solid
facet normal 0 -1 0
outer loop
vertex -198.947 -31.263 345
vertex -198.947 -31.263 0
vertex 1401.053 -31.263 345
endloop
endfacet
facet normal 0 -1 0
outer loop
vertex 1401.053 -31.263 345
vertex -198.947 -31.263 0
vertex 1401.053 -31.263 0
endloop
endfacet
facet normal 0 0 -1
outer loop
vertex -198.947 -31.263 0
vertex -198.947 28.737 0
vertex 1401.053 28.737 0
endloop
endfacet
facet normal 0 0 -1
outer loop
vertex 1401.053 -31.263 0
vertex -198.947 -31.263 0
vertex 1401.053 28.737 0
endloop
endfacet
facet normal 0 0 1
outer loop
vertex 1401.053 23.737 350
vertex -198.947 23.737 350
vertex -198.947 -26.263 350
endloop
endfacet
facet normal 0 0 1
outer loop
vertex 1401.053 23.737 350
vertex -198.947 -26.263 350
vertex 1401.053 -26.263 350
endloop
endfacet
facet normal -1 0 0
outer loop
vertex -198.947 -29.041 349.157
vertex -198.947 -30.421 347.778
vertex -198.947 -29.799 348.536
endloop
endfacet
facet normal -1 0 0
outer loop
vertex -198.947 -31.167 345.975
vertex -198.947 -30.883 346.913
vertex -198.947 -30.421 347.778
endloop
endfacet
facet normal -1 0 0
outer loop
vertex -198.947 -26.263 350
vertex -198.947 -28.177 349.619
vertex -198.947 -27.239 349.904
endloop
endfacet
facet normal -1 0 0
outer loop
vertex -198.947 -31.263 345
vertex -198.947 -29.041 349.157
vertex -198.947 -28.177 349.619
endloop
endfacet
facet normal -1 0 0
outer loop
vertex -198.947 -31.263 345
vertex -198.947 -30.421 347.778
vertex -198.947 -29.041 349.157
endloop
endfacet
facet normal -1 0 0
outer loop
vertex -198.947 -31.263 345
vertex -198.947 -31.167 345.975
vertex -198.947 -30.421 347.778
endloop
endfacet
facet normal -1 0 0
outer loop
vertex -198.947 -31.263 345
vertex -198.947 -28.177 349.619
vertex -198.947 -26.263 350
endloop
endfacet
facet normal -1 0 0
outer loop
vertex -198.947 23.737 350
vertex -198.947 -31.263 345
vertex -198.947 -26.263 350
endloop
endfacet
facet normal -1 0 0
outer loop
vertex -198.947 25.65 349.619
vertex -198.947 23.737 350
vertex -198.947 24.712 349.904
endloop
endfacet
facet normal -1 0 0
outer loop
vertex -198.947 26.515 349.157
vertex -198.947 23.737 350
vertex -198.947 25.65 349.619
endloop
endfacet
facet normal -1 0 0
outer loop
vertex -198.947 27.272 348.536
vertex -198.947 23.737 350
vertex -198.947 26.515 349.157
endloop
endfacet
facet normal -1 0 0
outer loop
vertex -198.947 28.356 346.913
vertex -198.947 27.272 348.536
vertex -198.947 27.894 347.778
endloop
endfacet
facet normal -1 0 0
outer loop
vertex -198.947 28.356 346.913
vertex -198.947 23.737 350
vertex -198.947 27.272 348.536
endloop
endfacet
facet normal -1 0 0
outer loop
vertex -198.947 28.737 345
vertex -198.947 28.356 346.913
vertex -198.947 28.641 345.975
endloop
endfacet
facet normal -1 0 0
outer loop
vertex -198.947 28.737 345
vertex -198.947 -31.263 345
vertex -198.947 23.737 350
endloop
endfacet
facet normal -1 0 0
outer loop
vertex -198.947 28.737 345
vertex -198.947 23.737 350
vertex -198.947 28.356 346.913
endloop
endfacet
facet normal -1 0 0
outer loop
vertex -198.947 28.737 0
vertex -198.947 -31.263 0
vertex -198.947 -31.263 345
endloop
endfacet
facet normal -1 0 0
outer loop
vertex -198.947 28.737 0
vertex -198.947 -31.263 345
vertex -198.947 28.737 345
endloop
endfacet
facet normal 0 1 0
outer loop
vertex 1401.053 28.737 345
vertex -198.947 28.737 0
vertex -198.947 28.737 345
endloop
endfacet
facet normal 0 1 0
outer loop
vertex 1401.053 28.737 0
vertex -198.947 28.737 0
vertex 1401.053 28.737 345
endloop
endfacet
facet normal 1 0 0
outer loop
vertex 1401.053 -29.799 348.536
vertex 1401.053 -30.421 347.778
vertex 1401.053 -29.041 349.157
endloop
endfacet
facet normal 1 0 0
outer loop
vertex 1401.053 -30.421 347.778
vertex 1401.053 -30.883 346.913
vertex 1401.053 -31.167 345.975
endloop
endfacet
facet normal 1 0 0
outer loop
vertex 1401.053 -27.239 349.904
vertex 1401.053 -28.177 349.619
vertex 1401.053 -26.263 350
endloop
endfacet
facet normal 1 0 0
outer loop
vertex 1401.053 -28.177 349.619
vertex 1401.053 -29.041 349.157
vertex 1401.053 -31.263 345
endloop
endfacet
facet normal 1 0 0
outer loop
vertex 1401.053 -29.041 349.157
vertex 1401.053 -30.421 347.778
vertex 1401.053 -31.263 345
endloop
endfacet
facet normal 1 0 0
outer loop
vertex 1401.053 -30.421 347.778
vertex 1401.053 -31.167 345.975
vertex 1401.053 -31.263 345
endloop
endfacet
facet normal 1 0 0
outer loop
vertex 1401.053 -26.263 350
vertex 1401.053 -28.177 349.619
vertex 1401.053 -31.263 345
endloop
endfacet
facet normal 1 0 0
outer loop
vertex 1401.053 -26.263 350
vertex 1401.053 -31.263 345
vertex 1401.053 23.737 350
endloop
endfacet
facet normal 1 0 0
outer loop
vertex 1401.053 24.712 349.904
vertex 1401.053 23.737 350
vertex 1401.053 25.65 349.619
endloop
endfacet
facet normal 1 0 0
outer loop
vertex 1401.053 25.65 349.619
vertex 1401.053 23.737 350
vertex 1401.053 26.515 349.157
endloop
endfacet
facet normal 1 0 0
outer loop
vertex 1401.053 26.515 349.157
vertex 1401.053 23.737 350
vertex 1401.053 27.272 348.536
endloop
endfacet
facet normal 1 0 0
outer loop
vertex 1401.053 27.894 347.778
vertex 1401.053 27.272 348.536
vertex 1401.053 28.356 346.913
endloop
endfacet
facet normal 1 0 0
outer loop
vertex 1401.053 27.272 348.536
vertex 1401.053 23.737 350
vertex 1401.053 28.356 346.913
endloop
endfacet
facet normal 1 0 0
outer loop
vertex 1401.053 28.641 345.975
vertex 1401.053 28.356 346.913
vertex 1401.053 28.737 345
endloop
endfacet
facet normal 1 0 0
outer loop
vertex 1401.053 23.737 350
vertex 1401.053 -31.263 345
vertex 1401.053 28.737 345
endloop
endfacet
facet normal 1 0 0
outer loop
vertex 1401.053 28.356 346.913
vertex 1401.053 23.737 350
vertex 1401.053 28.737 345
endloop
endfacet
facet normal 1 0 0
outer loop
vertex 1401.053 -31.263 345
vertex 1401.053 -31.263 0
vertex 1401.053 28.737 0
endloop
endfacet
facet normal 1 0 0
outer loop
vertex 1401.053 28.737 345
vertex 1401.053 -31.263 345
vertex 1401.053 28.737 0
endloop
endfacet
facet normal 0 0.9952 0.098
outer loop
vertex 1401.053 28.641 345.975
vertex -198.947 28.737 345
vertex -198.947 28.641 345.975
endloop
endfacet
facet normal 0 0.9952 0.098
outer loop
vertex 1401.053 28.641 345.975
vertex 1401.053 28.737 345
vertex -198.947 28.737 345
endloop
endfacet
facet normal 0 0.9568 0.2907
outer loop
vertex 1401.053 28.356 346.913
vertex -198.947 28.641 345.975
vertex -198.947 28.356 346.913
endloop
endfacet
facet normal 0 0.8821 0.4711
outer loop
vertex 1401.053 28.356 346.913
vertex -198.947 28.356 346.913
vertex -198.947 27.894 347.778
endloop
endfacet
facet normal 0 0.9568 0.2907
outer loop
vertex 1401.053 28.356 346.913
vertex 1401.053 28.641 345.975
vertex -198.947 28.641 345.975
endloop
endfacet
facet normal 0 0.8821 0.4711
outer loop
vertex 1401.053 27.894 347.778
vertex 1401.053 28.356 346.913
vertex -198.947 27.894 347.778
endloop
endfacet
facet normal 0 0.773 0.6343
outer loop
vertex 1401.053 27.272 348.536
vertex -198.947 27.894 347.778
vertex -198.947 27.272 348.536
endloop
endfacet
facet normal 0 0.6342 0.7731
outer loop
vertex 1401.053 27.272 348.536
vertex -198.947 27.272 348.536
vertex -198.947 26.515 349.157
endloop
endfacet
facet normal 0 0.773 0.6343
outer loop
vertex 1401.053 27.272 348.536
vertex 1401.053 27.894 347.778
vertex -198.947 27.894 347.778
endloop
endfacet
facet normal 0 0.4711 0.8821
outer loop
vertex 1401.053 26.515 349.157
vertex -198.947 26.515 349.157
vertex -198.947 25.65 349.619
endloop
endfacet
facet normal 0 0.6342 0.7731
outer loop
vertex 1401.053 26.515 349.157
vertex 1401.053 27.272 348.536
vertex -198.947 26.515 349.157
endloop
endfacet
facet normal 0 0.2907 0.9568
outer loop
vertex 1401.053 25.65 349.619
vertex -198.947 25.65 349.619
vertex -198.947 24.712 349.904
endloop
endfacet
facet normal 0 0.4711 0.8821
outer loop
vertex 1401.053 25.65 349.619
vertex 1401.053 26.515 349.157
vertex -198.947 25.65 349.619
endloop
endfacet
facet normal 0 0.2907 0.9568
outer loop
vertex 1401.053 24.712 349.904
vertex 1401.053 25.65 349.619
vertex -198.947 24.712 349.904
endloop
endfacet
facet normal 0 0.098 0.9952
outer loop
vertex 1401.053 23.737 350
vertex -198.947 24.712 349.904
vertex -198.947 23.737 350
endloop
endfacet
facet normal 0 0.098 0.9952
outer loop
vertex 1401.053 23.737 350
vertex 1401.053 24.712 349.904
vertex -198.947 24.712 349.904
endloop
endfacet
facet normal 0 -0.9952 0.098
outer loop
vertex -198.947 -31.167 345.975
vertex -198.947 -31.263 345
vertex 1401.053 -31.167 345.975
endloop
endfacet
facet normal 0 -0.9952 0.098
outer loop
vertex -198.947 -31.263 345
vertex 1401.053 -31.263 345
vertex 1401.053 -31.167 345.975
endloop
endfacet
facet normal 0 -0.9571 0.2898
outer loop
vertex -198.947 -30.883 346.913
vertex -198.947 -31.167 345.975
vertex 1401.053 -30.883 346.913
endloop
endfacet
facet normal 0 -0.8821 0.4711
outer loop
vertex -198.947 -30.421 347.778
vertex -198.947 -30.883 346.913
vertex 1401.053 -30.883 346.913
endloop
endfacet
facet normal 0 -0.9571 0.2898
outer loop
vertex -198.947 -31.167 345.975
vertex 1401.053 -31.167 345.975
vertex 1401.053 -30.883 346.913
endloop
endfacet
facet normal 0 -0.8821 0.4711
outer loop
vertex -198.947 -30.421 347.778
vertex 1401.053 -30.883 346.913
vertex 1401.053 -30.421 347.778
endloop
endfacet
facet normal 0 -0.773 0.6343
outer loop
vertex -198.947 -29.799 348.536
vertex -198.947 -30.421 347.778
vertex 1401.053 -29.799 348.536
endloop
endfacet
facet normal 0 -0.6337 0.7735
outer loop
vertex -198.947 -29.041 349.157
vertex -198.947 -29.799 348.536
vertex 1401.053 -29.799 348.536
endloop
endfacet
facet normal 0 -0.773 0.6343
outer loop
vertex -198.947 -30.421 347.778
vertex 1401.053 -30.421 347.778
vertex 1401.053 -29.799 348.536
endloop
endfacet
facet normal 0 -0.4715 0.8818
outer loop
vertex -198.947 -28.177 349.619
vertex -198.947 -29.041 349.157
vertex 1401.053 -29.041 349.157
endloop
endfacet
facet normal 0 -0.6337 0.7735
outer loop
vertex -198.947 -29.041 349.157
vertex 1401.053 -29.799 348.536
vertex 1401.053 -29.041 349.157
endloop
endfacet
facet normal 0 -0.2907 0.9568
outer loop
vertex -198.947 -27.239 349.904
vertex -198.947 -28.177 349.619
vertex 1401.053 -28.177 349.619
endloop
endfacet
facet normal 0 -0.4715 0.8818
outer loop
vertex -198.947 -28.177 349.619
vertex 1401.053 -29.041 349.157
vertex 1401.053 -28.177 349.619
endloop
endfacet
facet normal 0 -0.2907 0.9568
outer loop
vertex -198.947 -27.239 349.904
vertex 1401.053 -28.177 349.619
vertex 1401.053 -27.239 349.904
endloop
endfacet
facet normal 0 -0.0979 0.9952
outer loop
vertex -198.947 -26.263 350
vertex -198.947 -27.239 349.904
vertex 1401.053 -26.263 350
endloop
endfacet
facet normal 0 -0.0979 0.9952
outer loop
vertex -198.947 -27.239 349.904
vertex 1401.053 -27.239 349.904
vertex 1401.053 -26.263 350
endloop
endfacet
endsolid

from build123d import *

# Parameters (mm, degrees)
SKETCH_1_W        = 1600
SKETCH_1_H        = 60
EXTRUDE_258_DEPTH = 350
FILLET_1_R        = 5


with BuildPart() as part:
    # Эскиз1 → Extrude 258 (new body)
    with BuildSketch(Plane.XY):
        with Locations((601.052631579, -1.263157895)):
            Rectangle(SKETCH_1_W, SKETCH_1_H)
    extrude(amount=EXTRUDE_258_DEPTH)

    # Скругление1
    fillet_1_edges = [part.edges().sort_by_distance(p)[0] for p in [
        (601.052631579, 28.736842105, 350),
        (601.052631579, -31.263157895, 350),
    ]]
    fillet(fillet_1_edges, radius=FILLET_1_R)


solid = part.part
